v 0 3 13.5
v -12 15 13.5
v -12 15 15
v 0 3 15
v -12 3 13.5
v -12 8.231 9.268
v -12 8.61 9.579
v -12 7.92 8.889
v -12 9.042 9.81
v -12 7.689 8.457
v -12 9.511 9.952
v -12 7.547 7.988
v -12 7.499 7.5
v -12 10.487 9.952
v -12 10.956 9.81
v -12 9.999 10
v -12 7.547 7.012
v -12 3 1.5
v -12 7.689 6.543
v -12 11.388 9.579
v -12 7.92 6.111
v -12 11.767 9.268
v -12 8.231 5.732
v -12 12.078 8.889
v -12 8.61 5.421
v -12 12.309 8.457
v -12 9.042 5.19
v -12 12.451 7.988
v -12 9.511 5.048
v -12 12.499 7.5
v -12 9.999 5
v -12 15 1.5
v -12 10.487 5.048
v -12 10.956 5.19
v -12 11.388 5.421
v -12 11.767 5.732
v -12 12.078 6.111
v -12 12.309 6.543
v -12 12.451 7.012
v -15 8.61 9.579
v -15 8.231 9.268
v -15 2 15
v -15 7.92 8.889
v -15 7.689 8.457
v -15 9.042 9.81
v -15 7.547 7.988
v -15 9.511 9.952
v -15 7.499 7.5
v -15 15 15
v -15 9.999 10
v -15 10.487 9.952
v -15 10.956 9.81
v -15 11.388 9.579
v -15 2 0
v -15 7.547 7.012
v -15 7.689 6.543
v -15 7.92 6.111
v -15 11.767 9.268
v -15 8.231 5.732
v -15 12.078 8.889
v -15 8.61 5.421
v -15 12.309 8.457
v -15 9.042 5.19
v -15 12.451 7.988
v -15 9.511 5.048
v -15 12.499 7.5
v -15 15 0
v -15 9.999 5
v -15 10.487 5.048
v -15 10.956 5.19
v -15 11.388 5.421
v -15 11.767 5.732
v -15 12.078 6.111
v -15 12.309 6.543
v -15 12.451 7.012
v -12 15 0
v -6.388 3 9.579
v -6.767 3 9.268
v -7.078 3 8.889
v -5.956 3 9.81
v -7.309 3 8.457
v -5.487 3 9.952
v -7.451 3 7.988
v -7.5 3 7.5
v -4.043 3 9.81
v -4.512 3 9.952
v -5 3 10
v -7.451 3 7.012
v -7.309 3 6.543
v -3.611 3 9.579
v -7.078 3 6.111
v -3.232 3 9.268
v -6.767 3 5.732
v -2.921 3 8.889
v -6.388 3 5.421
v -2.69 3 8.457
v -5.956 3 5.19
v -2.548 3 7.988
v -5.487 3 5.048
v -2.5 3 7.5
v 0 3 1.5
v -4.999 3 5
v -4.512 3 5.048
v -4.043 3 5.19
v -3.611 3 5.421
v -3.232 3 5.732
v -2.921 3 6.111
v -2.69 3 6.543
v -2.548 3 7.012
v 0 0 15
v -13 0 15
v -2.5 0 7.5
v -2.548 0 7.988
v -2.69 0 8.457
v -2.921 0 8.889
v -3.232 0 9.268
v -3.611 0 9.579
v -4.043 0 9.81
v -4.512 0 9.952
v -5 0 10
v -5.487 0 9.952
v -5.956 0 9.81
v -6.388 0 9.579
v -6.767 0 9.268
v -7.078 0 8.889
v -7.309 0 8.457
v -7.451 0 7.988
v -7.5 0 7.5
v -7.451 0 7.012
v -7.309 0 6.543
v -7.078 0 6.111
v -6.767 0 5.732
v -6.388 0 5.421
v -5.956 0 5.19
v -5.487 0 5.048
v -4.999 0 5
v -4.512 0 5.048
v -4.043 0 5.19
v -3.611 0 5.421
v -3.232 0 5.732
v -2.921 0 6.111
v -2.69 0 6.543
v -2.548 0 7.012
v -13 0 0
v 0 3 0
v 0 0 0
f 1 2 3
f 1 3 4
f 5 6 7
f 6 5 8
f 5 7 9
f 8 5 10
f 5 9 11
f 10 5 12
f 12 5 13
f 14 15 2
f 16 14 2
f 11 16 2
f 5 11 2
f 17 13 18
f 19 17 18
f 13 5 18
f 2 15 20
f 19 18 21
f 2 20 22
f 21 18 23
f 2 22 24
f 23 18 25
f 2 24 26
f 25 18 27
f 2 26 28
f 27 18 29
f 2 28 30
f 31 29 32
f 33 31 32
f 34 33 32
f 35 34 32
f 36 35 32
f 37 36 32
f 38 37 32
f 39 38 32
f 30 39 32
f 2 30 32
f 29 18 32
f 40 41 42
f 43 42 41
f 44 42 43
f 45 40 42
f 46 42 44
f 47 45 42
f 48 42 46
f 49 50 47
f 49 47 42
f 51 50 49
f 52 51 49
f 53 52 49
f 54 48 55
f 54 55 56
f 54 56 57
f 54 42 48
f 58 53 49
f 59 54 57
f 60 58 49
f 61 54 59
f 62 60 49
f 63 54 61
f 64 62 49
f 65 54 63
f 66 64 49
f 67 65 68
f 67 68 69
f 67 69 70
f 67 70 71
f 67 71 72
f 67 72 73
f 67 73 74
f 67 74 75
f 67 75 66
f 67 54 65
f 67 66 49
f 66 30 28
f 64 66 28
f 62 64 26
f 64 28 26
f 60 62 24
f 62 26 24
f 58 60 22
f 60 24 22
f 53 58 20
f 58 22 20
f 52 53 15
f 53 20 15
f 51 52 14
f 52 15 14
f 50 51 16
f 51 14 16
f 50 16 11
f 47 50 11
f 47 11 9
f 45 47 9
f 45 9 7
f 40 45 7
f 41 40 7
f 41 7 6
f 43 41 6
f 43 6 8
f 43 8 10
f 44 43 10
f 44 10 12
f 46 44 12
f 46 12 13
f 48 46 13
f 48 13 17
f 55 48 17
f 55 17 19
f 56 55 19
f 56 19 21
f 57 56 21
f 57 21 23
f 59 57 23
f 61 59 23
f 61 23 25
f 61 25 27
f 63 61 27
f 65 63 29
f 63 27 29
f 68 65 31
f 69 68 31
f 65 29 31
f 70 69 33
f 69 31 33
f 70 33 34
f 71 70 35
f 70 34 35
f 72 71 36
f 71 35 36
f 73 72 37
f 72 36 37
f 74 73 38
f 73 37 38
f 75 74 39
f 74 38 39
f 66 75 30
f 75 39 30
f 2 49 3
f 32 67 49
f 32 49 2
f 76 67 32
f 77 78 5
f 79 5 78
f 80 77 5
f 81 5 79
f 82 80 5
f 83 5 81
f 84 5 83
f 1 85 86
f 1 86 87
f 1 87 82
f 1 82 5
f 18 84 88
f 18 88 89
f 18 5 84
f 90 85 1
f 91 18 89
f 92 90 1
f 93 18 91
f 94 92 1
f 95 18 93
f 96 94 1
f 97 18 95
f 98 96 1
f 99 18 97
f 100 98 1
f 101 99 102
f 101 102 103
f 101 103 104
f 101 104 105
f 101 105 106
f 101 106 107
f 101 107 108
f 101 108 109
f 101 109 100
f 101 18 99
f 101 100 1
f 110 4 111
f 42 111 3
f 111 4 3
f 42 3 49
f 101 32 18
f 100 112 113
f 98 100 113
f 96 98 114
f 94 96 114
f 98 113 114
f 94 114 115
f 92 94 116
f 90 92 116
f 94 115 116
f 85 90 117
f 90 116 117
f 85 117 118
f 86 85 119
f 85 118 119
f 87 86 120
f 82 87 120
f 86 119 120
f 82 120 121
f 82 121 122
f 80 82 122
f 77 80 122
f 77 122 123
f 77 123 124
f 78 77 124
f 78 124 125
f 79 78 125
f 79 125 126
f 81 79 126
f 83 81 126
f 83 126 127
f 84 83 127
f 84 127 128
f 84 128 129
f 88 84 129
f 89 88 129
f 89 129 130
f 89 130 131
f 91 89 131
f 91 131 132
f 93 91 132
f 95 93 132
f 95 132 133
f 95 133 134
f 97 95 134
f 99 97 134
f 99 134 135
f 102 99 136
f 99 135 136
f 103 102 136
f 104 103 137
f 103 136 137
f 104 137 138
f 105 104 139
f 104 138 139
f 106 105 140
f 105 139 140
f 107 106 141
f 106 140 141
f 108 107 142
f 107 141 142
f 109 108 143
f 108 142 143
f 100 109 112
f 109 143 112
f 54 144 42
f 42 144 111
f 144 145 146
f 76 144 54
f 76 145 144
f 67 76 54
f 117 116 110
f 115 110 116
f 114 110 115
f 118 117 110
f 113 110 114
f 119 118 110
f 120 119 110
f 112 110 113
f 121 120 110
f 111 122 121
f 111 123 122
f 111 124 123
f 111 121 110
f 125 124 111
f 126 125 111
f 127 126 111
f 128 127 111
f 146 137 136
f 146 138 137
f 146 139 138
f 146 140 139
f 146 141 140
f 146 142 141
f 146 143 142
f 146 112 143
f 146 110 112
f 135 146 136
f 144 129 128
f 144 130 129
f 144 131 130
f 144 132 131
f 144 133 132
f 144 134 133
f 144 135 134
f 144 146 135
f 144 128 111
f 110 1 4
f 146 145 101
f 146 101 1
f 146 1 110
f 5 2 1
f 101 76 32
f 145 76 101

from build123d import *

# Parameters (mm, degrees)
PAD_DEPTH       = 15
SKETCH001_W     = 15
SKETCH001_H     = 15
POCKET_DEPTH    = 12
SKETCH002_R     = 2.5
POCKET001_DEPTH = 5
SKETCH003_R     = 2.5
POCKET002_DEPTH = 19
CHAMFER_SIZE    = 2


with BuildPart() as part:
    # Sketch → Pad (new body)
    with BuildSketch(Plane.XY):
        Polygon((-15, 15), (-12, 15), (0, 3), (0, 0), (-15, 0), align=None)
    extrude(amount=PAD_DEPTH)

    # Sketch001 → Pocket (cut)
    with BuildSketch(Plane.XY.offset(1.5)):
        with Locations((-4.5, 10.5)):
            Rectangle(SKETCH001_W, SKETCH001_H)
    extrude(amount=POCKET_DEPTH, mode=Mode.SUBTRACT)

    # Sketch002 → Pocket001 (cut)
    with BuildSketch(Plane.XZ):
        with Locations((-4.9995, 7.5)):
            Circle(SKETCH002_R)
    extrude(amount=-POCKET001_DEPTH, mode=Mode.SUBTRACT)

    # Sketch003 → Pocket002 (cut)
    with BuildSketch(Plane.YZ):
        with Locations((9.999, 7.5)):
            Circle(SKETCH003_R)
    extrude(amount=-POCKET002_DEPTH, mode=Mode.SUBTRACT)

    # Chamfer
    chamfer_edges = [part.edges().sort_by_distance(p)[0] for p in [
        (-15, 0, 7.5),
    ]]
    chamfer(chamfer_edges, length=CHAMFER_SIZE)


solid = part.part
